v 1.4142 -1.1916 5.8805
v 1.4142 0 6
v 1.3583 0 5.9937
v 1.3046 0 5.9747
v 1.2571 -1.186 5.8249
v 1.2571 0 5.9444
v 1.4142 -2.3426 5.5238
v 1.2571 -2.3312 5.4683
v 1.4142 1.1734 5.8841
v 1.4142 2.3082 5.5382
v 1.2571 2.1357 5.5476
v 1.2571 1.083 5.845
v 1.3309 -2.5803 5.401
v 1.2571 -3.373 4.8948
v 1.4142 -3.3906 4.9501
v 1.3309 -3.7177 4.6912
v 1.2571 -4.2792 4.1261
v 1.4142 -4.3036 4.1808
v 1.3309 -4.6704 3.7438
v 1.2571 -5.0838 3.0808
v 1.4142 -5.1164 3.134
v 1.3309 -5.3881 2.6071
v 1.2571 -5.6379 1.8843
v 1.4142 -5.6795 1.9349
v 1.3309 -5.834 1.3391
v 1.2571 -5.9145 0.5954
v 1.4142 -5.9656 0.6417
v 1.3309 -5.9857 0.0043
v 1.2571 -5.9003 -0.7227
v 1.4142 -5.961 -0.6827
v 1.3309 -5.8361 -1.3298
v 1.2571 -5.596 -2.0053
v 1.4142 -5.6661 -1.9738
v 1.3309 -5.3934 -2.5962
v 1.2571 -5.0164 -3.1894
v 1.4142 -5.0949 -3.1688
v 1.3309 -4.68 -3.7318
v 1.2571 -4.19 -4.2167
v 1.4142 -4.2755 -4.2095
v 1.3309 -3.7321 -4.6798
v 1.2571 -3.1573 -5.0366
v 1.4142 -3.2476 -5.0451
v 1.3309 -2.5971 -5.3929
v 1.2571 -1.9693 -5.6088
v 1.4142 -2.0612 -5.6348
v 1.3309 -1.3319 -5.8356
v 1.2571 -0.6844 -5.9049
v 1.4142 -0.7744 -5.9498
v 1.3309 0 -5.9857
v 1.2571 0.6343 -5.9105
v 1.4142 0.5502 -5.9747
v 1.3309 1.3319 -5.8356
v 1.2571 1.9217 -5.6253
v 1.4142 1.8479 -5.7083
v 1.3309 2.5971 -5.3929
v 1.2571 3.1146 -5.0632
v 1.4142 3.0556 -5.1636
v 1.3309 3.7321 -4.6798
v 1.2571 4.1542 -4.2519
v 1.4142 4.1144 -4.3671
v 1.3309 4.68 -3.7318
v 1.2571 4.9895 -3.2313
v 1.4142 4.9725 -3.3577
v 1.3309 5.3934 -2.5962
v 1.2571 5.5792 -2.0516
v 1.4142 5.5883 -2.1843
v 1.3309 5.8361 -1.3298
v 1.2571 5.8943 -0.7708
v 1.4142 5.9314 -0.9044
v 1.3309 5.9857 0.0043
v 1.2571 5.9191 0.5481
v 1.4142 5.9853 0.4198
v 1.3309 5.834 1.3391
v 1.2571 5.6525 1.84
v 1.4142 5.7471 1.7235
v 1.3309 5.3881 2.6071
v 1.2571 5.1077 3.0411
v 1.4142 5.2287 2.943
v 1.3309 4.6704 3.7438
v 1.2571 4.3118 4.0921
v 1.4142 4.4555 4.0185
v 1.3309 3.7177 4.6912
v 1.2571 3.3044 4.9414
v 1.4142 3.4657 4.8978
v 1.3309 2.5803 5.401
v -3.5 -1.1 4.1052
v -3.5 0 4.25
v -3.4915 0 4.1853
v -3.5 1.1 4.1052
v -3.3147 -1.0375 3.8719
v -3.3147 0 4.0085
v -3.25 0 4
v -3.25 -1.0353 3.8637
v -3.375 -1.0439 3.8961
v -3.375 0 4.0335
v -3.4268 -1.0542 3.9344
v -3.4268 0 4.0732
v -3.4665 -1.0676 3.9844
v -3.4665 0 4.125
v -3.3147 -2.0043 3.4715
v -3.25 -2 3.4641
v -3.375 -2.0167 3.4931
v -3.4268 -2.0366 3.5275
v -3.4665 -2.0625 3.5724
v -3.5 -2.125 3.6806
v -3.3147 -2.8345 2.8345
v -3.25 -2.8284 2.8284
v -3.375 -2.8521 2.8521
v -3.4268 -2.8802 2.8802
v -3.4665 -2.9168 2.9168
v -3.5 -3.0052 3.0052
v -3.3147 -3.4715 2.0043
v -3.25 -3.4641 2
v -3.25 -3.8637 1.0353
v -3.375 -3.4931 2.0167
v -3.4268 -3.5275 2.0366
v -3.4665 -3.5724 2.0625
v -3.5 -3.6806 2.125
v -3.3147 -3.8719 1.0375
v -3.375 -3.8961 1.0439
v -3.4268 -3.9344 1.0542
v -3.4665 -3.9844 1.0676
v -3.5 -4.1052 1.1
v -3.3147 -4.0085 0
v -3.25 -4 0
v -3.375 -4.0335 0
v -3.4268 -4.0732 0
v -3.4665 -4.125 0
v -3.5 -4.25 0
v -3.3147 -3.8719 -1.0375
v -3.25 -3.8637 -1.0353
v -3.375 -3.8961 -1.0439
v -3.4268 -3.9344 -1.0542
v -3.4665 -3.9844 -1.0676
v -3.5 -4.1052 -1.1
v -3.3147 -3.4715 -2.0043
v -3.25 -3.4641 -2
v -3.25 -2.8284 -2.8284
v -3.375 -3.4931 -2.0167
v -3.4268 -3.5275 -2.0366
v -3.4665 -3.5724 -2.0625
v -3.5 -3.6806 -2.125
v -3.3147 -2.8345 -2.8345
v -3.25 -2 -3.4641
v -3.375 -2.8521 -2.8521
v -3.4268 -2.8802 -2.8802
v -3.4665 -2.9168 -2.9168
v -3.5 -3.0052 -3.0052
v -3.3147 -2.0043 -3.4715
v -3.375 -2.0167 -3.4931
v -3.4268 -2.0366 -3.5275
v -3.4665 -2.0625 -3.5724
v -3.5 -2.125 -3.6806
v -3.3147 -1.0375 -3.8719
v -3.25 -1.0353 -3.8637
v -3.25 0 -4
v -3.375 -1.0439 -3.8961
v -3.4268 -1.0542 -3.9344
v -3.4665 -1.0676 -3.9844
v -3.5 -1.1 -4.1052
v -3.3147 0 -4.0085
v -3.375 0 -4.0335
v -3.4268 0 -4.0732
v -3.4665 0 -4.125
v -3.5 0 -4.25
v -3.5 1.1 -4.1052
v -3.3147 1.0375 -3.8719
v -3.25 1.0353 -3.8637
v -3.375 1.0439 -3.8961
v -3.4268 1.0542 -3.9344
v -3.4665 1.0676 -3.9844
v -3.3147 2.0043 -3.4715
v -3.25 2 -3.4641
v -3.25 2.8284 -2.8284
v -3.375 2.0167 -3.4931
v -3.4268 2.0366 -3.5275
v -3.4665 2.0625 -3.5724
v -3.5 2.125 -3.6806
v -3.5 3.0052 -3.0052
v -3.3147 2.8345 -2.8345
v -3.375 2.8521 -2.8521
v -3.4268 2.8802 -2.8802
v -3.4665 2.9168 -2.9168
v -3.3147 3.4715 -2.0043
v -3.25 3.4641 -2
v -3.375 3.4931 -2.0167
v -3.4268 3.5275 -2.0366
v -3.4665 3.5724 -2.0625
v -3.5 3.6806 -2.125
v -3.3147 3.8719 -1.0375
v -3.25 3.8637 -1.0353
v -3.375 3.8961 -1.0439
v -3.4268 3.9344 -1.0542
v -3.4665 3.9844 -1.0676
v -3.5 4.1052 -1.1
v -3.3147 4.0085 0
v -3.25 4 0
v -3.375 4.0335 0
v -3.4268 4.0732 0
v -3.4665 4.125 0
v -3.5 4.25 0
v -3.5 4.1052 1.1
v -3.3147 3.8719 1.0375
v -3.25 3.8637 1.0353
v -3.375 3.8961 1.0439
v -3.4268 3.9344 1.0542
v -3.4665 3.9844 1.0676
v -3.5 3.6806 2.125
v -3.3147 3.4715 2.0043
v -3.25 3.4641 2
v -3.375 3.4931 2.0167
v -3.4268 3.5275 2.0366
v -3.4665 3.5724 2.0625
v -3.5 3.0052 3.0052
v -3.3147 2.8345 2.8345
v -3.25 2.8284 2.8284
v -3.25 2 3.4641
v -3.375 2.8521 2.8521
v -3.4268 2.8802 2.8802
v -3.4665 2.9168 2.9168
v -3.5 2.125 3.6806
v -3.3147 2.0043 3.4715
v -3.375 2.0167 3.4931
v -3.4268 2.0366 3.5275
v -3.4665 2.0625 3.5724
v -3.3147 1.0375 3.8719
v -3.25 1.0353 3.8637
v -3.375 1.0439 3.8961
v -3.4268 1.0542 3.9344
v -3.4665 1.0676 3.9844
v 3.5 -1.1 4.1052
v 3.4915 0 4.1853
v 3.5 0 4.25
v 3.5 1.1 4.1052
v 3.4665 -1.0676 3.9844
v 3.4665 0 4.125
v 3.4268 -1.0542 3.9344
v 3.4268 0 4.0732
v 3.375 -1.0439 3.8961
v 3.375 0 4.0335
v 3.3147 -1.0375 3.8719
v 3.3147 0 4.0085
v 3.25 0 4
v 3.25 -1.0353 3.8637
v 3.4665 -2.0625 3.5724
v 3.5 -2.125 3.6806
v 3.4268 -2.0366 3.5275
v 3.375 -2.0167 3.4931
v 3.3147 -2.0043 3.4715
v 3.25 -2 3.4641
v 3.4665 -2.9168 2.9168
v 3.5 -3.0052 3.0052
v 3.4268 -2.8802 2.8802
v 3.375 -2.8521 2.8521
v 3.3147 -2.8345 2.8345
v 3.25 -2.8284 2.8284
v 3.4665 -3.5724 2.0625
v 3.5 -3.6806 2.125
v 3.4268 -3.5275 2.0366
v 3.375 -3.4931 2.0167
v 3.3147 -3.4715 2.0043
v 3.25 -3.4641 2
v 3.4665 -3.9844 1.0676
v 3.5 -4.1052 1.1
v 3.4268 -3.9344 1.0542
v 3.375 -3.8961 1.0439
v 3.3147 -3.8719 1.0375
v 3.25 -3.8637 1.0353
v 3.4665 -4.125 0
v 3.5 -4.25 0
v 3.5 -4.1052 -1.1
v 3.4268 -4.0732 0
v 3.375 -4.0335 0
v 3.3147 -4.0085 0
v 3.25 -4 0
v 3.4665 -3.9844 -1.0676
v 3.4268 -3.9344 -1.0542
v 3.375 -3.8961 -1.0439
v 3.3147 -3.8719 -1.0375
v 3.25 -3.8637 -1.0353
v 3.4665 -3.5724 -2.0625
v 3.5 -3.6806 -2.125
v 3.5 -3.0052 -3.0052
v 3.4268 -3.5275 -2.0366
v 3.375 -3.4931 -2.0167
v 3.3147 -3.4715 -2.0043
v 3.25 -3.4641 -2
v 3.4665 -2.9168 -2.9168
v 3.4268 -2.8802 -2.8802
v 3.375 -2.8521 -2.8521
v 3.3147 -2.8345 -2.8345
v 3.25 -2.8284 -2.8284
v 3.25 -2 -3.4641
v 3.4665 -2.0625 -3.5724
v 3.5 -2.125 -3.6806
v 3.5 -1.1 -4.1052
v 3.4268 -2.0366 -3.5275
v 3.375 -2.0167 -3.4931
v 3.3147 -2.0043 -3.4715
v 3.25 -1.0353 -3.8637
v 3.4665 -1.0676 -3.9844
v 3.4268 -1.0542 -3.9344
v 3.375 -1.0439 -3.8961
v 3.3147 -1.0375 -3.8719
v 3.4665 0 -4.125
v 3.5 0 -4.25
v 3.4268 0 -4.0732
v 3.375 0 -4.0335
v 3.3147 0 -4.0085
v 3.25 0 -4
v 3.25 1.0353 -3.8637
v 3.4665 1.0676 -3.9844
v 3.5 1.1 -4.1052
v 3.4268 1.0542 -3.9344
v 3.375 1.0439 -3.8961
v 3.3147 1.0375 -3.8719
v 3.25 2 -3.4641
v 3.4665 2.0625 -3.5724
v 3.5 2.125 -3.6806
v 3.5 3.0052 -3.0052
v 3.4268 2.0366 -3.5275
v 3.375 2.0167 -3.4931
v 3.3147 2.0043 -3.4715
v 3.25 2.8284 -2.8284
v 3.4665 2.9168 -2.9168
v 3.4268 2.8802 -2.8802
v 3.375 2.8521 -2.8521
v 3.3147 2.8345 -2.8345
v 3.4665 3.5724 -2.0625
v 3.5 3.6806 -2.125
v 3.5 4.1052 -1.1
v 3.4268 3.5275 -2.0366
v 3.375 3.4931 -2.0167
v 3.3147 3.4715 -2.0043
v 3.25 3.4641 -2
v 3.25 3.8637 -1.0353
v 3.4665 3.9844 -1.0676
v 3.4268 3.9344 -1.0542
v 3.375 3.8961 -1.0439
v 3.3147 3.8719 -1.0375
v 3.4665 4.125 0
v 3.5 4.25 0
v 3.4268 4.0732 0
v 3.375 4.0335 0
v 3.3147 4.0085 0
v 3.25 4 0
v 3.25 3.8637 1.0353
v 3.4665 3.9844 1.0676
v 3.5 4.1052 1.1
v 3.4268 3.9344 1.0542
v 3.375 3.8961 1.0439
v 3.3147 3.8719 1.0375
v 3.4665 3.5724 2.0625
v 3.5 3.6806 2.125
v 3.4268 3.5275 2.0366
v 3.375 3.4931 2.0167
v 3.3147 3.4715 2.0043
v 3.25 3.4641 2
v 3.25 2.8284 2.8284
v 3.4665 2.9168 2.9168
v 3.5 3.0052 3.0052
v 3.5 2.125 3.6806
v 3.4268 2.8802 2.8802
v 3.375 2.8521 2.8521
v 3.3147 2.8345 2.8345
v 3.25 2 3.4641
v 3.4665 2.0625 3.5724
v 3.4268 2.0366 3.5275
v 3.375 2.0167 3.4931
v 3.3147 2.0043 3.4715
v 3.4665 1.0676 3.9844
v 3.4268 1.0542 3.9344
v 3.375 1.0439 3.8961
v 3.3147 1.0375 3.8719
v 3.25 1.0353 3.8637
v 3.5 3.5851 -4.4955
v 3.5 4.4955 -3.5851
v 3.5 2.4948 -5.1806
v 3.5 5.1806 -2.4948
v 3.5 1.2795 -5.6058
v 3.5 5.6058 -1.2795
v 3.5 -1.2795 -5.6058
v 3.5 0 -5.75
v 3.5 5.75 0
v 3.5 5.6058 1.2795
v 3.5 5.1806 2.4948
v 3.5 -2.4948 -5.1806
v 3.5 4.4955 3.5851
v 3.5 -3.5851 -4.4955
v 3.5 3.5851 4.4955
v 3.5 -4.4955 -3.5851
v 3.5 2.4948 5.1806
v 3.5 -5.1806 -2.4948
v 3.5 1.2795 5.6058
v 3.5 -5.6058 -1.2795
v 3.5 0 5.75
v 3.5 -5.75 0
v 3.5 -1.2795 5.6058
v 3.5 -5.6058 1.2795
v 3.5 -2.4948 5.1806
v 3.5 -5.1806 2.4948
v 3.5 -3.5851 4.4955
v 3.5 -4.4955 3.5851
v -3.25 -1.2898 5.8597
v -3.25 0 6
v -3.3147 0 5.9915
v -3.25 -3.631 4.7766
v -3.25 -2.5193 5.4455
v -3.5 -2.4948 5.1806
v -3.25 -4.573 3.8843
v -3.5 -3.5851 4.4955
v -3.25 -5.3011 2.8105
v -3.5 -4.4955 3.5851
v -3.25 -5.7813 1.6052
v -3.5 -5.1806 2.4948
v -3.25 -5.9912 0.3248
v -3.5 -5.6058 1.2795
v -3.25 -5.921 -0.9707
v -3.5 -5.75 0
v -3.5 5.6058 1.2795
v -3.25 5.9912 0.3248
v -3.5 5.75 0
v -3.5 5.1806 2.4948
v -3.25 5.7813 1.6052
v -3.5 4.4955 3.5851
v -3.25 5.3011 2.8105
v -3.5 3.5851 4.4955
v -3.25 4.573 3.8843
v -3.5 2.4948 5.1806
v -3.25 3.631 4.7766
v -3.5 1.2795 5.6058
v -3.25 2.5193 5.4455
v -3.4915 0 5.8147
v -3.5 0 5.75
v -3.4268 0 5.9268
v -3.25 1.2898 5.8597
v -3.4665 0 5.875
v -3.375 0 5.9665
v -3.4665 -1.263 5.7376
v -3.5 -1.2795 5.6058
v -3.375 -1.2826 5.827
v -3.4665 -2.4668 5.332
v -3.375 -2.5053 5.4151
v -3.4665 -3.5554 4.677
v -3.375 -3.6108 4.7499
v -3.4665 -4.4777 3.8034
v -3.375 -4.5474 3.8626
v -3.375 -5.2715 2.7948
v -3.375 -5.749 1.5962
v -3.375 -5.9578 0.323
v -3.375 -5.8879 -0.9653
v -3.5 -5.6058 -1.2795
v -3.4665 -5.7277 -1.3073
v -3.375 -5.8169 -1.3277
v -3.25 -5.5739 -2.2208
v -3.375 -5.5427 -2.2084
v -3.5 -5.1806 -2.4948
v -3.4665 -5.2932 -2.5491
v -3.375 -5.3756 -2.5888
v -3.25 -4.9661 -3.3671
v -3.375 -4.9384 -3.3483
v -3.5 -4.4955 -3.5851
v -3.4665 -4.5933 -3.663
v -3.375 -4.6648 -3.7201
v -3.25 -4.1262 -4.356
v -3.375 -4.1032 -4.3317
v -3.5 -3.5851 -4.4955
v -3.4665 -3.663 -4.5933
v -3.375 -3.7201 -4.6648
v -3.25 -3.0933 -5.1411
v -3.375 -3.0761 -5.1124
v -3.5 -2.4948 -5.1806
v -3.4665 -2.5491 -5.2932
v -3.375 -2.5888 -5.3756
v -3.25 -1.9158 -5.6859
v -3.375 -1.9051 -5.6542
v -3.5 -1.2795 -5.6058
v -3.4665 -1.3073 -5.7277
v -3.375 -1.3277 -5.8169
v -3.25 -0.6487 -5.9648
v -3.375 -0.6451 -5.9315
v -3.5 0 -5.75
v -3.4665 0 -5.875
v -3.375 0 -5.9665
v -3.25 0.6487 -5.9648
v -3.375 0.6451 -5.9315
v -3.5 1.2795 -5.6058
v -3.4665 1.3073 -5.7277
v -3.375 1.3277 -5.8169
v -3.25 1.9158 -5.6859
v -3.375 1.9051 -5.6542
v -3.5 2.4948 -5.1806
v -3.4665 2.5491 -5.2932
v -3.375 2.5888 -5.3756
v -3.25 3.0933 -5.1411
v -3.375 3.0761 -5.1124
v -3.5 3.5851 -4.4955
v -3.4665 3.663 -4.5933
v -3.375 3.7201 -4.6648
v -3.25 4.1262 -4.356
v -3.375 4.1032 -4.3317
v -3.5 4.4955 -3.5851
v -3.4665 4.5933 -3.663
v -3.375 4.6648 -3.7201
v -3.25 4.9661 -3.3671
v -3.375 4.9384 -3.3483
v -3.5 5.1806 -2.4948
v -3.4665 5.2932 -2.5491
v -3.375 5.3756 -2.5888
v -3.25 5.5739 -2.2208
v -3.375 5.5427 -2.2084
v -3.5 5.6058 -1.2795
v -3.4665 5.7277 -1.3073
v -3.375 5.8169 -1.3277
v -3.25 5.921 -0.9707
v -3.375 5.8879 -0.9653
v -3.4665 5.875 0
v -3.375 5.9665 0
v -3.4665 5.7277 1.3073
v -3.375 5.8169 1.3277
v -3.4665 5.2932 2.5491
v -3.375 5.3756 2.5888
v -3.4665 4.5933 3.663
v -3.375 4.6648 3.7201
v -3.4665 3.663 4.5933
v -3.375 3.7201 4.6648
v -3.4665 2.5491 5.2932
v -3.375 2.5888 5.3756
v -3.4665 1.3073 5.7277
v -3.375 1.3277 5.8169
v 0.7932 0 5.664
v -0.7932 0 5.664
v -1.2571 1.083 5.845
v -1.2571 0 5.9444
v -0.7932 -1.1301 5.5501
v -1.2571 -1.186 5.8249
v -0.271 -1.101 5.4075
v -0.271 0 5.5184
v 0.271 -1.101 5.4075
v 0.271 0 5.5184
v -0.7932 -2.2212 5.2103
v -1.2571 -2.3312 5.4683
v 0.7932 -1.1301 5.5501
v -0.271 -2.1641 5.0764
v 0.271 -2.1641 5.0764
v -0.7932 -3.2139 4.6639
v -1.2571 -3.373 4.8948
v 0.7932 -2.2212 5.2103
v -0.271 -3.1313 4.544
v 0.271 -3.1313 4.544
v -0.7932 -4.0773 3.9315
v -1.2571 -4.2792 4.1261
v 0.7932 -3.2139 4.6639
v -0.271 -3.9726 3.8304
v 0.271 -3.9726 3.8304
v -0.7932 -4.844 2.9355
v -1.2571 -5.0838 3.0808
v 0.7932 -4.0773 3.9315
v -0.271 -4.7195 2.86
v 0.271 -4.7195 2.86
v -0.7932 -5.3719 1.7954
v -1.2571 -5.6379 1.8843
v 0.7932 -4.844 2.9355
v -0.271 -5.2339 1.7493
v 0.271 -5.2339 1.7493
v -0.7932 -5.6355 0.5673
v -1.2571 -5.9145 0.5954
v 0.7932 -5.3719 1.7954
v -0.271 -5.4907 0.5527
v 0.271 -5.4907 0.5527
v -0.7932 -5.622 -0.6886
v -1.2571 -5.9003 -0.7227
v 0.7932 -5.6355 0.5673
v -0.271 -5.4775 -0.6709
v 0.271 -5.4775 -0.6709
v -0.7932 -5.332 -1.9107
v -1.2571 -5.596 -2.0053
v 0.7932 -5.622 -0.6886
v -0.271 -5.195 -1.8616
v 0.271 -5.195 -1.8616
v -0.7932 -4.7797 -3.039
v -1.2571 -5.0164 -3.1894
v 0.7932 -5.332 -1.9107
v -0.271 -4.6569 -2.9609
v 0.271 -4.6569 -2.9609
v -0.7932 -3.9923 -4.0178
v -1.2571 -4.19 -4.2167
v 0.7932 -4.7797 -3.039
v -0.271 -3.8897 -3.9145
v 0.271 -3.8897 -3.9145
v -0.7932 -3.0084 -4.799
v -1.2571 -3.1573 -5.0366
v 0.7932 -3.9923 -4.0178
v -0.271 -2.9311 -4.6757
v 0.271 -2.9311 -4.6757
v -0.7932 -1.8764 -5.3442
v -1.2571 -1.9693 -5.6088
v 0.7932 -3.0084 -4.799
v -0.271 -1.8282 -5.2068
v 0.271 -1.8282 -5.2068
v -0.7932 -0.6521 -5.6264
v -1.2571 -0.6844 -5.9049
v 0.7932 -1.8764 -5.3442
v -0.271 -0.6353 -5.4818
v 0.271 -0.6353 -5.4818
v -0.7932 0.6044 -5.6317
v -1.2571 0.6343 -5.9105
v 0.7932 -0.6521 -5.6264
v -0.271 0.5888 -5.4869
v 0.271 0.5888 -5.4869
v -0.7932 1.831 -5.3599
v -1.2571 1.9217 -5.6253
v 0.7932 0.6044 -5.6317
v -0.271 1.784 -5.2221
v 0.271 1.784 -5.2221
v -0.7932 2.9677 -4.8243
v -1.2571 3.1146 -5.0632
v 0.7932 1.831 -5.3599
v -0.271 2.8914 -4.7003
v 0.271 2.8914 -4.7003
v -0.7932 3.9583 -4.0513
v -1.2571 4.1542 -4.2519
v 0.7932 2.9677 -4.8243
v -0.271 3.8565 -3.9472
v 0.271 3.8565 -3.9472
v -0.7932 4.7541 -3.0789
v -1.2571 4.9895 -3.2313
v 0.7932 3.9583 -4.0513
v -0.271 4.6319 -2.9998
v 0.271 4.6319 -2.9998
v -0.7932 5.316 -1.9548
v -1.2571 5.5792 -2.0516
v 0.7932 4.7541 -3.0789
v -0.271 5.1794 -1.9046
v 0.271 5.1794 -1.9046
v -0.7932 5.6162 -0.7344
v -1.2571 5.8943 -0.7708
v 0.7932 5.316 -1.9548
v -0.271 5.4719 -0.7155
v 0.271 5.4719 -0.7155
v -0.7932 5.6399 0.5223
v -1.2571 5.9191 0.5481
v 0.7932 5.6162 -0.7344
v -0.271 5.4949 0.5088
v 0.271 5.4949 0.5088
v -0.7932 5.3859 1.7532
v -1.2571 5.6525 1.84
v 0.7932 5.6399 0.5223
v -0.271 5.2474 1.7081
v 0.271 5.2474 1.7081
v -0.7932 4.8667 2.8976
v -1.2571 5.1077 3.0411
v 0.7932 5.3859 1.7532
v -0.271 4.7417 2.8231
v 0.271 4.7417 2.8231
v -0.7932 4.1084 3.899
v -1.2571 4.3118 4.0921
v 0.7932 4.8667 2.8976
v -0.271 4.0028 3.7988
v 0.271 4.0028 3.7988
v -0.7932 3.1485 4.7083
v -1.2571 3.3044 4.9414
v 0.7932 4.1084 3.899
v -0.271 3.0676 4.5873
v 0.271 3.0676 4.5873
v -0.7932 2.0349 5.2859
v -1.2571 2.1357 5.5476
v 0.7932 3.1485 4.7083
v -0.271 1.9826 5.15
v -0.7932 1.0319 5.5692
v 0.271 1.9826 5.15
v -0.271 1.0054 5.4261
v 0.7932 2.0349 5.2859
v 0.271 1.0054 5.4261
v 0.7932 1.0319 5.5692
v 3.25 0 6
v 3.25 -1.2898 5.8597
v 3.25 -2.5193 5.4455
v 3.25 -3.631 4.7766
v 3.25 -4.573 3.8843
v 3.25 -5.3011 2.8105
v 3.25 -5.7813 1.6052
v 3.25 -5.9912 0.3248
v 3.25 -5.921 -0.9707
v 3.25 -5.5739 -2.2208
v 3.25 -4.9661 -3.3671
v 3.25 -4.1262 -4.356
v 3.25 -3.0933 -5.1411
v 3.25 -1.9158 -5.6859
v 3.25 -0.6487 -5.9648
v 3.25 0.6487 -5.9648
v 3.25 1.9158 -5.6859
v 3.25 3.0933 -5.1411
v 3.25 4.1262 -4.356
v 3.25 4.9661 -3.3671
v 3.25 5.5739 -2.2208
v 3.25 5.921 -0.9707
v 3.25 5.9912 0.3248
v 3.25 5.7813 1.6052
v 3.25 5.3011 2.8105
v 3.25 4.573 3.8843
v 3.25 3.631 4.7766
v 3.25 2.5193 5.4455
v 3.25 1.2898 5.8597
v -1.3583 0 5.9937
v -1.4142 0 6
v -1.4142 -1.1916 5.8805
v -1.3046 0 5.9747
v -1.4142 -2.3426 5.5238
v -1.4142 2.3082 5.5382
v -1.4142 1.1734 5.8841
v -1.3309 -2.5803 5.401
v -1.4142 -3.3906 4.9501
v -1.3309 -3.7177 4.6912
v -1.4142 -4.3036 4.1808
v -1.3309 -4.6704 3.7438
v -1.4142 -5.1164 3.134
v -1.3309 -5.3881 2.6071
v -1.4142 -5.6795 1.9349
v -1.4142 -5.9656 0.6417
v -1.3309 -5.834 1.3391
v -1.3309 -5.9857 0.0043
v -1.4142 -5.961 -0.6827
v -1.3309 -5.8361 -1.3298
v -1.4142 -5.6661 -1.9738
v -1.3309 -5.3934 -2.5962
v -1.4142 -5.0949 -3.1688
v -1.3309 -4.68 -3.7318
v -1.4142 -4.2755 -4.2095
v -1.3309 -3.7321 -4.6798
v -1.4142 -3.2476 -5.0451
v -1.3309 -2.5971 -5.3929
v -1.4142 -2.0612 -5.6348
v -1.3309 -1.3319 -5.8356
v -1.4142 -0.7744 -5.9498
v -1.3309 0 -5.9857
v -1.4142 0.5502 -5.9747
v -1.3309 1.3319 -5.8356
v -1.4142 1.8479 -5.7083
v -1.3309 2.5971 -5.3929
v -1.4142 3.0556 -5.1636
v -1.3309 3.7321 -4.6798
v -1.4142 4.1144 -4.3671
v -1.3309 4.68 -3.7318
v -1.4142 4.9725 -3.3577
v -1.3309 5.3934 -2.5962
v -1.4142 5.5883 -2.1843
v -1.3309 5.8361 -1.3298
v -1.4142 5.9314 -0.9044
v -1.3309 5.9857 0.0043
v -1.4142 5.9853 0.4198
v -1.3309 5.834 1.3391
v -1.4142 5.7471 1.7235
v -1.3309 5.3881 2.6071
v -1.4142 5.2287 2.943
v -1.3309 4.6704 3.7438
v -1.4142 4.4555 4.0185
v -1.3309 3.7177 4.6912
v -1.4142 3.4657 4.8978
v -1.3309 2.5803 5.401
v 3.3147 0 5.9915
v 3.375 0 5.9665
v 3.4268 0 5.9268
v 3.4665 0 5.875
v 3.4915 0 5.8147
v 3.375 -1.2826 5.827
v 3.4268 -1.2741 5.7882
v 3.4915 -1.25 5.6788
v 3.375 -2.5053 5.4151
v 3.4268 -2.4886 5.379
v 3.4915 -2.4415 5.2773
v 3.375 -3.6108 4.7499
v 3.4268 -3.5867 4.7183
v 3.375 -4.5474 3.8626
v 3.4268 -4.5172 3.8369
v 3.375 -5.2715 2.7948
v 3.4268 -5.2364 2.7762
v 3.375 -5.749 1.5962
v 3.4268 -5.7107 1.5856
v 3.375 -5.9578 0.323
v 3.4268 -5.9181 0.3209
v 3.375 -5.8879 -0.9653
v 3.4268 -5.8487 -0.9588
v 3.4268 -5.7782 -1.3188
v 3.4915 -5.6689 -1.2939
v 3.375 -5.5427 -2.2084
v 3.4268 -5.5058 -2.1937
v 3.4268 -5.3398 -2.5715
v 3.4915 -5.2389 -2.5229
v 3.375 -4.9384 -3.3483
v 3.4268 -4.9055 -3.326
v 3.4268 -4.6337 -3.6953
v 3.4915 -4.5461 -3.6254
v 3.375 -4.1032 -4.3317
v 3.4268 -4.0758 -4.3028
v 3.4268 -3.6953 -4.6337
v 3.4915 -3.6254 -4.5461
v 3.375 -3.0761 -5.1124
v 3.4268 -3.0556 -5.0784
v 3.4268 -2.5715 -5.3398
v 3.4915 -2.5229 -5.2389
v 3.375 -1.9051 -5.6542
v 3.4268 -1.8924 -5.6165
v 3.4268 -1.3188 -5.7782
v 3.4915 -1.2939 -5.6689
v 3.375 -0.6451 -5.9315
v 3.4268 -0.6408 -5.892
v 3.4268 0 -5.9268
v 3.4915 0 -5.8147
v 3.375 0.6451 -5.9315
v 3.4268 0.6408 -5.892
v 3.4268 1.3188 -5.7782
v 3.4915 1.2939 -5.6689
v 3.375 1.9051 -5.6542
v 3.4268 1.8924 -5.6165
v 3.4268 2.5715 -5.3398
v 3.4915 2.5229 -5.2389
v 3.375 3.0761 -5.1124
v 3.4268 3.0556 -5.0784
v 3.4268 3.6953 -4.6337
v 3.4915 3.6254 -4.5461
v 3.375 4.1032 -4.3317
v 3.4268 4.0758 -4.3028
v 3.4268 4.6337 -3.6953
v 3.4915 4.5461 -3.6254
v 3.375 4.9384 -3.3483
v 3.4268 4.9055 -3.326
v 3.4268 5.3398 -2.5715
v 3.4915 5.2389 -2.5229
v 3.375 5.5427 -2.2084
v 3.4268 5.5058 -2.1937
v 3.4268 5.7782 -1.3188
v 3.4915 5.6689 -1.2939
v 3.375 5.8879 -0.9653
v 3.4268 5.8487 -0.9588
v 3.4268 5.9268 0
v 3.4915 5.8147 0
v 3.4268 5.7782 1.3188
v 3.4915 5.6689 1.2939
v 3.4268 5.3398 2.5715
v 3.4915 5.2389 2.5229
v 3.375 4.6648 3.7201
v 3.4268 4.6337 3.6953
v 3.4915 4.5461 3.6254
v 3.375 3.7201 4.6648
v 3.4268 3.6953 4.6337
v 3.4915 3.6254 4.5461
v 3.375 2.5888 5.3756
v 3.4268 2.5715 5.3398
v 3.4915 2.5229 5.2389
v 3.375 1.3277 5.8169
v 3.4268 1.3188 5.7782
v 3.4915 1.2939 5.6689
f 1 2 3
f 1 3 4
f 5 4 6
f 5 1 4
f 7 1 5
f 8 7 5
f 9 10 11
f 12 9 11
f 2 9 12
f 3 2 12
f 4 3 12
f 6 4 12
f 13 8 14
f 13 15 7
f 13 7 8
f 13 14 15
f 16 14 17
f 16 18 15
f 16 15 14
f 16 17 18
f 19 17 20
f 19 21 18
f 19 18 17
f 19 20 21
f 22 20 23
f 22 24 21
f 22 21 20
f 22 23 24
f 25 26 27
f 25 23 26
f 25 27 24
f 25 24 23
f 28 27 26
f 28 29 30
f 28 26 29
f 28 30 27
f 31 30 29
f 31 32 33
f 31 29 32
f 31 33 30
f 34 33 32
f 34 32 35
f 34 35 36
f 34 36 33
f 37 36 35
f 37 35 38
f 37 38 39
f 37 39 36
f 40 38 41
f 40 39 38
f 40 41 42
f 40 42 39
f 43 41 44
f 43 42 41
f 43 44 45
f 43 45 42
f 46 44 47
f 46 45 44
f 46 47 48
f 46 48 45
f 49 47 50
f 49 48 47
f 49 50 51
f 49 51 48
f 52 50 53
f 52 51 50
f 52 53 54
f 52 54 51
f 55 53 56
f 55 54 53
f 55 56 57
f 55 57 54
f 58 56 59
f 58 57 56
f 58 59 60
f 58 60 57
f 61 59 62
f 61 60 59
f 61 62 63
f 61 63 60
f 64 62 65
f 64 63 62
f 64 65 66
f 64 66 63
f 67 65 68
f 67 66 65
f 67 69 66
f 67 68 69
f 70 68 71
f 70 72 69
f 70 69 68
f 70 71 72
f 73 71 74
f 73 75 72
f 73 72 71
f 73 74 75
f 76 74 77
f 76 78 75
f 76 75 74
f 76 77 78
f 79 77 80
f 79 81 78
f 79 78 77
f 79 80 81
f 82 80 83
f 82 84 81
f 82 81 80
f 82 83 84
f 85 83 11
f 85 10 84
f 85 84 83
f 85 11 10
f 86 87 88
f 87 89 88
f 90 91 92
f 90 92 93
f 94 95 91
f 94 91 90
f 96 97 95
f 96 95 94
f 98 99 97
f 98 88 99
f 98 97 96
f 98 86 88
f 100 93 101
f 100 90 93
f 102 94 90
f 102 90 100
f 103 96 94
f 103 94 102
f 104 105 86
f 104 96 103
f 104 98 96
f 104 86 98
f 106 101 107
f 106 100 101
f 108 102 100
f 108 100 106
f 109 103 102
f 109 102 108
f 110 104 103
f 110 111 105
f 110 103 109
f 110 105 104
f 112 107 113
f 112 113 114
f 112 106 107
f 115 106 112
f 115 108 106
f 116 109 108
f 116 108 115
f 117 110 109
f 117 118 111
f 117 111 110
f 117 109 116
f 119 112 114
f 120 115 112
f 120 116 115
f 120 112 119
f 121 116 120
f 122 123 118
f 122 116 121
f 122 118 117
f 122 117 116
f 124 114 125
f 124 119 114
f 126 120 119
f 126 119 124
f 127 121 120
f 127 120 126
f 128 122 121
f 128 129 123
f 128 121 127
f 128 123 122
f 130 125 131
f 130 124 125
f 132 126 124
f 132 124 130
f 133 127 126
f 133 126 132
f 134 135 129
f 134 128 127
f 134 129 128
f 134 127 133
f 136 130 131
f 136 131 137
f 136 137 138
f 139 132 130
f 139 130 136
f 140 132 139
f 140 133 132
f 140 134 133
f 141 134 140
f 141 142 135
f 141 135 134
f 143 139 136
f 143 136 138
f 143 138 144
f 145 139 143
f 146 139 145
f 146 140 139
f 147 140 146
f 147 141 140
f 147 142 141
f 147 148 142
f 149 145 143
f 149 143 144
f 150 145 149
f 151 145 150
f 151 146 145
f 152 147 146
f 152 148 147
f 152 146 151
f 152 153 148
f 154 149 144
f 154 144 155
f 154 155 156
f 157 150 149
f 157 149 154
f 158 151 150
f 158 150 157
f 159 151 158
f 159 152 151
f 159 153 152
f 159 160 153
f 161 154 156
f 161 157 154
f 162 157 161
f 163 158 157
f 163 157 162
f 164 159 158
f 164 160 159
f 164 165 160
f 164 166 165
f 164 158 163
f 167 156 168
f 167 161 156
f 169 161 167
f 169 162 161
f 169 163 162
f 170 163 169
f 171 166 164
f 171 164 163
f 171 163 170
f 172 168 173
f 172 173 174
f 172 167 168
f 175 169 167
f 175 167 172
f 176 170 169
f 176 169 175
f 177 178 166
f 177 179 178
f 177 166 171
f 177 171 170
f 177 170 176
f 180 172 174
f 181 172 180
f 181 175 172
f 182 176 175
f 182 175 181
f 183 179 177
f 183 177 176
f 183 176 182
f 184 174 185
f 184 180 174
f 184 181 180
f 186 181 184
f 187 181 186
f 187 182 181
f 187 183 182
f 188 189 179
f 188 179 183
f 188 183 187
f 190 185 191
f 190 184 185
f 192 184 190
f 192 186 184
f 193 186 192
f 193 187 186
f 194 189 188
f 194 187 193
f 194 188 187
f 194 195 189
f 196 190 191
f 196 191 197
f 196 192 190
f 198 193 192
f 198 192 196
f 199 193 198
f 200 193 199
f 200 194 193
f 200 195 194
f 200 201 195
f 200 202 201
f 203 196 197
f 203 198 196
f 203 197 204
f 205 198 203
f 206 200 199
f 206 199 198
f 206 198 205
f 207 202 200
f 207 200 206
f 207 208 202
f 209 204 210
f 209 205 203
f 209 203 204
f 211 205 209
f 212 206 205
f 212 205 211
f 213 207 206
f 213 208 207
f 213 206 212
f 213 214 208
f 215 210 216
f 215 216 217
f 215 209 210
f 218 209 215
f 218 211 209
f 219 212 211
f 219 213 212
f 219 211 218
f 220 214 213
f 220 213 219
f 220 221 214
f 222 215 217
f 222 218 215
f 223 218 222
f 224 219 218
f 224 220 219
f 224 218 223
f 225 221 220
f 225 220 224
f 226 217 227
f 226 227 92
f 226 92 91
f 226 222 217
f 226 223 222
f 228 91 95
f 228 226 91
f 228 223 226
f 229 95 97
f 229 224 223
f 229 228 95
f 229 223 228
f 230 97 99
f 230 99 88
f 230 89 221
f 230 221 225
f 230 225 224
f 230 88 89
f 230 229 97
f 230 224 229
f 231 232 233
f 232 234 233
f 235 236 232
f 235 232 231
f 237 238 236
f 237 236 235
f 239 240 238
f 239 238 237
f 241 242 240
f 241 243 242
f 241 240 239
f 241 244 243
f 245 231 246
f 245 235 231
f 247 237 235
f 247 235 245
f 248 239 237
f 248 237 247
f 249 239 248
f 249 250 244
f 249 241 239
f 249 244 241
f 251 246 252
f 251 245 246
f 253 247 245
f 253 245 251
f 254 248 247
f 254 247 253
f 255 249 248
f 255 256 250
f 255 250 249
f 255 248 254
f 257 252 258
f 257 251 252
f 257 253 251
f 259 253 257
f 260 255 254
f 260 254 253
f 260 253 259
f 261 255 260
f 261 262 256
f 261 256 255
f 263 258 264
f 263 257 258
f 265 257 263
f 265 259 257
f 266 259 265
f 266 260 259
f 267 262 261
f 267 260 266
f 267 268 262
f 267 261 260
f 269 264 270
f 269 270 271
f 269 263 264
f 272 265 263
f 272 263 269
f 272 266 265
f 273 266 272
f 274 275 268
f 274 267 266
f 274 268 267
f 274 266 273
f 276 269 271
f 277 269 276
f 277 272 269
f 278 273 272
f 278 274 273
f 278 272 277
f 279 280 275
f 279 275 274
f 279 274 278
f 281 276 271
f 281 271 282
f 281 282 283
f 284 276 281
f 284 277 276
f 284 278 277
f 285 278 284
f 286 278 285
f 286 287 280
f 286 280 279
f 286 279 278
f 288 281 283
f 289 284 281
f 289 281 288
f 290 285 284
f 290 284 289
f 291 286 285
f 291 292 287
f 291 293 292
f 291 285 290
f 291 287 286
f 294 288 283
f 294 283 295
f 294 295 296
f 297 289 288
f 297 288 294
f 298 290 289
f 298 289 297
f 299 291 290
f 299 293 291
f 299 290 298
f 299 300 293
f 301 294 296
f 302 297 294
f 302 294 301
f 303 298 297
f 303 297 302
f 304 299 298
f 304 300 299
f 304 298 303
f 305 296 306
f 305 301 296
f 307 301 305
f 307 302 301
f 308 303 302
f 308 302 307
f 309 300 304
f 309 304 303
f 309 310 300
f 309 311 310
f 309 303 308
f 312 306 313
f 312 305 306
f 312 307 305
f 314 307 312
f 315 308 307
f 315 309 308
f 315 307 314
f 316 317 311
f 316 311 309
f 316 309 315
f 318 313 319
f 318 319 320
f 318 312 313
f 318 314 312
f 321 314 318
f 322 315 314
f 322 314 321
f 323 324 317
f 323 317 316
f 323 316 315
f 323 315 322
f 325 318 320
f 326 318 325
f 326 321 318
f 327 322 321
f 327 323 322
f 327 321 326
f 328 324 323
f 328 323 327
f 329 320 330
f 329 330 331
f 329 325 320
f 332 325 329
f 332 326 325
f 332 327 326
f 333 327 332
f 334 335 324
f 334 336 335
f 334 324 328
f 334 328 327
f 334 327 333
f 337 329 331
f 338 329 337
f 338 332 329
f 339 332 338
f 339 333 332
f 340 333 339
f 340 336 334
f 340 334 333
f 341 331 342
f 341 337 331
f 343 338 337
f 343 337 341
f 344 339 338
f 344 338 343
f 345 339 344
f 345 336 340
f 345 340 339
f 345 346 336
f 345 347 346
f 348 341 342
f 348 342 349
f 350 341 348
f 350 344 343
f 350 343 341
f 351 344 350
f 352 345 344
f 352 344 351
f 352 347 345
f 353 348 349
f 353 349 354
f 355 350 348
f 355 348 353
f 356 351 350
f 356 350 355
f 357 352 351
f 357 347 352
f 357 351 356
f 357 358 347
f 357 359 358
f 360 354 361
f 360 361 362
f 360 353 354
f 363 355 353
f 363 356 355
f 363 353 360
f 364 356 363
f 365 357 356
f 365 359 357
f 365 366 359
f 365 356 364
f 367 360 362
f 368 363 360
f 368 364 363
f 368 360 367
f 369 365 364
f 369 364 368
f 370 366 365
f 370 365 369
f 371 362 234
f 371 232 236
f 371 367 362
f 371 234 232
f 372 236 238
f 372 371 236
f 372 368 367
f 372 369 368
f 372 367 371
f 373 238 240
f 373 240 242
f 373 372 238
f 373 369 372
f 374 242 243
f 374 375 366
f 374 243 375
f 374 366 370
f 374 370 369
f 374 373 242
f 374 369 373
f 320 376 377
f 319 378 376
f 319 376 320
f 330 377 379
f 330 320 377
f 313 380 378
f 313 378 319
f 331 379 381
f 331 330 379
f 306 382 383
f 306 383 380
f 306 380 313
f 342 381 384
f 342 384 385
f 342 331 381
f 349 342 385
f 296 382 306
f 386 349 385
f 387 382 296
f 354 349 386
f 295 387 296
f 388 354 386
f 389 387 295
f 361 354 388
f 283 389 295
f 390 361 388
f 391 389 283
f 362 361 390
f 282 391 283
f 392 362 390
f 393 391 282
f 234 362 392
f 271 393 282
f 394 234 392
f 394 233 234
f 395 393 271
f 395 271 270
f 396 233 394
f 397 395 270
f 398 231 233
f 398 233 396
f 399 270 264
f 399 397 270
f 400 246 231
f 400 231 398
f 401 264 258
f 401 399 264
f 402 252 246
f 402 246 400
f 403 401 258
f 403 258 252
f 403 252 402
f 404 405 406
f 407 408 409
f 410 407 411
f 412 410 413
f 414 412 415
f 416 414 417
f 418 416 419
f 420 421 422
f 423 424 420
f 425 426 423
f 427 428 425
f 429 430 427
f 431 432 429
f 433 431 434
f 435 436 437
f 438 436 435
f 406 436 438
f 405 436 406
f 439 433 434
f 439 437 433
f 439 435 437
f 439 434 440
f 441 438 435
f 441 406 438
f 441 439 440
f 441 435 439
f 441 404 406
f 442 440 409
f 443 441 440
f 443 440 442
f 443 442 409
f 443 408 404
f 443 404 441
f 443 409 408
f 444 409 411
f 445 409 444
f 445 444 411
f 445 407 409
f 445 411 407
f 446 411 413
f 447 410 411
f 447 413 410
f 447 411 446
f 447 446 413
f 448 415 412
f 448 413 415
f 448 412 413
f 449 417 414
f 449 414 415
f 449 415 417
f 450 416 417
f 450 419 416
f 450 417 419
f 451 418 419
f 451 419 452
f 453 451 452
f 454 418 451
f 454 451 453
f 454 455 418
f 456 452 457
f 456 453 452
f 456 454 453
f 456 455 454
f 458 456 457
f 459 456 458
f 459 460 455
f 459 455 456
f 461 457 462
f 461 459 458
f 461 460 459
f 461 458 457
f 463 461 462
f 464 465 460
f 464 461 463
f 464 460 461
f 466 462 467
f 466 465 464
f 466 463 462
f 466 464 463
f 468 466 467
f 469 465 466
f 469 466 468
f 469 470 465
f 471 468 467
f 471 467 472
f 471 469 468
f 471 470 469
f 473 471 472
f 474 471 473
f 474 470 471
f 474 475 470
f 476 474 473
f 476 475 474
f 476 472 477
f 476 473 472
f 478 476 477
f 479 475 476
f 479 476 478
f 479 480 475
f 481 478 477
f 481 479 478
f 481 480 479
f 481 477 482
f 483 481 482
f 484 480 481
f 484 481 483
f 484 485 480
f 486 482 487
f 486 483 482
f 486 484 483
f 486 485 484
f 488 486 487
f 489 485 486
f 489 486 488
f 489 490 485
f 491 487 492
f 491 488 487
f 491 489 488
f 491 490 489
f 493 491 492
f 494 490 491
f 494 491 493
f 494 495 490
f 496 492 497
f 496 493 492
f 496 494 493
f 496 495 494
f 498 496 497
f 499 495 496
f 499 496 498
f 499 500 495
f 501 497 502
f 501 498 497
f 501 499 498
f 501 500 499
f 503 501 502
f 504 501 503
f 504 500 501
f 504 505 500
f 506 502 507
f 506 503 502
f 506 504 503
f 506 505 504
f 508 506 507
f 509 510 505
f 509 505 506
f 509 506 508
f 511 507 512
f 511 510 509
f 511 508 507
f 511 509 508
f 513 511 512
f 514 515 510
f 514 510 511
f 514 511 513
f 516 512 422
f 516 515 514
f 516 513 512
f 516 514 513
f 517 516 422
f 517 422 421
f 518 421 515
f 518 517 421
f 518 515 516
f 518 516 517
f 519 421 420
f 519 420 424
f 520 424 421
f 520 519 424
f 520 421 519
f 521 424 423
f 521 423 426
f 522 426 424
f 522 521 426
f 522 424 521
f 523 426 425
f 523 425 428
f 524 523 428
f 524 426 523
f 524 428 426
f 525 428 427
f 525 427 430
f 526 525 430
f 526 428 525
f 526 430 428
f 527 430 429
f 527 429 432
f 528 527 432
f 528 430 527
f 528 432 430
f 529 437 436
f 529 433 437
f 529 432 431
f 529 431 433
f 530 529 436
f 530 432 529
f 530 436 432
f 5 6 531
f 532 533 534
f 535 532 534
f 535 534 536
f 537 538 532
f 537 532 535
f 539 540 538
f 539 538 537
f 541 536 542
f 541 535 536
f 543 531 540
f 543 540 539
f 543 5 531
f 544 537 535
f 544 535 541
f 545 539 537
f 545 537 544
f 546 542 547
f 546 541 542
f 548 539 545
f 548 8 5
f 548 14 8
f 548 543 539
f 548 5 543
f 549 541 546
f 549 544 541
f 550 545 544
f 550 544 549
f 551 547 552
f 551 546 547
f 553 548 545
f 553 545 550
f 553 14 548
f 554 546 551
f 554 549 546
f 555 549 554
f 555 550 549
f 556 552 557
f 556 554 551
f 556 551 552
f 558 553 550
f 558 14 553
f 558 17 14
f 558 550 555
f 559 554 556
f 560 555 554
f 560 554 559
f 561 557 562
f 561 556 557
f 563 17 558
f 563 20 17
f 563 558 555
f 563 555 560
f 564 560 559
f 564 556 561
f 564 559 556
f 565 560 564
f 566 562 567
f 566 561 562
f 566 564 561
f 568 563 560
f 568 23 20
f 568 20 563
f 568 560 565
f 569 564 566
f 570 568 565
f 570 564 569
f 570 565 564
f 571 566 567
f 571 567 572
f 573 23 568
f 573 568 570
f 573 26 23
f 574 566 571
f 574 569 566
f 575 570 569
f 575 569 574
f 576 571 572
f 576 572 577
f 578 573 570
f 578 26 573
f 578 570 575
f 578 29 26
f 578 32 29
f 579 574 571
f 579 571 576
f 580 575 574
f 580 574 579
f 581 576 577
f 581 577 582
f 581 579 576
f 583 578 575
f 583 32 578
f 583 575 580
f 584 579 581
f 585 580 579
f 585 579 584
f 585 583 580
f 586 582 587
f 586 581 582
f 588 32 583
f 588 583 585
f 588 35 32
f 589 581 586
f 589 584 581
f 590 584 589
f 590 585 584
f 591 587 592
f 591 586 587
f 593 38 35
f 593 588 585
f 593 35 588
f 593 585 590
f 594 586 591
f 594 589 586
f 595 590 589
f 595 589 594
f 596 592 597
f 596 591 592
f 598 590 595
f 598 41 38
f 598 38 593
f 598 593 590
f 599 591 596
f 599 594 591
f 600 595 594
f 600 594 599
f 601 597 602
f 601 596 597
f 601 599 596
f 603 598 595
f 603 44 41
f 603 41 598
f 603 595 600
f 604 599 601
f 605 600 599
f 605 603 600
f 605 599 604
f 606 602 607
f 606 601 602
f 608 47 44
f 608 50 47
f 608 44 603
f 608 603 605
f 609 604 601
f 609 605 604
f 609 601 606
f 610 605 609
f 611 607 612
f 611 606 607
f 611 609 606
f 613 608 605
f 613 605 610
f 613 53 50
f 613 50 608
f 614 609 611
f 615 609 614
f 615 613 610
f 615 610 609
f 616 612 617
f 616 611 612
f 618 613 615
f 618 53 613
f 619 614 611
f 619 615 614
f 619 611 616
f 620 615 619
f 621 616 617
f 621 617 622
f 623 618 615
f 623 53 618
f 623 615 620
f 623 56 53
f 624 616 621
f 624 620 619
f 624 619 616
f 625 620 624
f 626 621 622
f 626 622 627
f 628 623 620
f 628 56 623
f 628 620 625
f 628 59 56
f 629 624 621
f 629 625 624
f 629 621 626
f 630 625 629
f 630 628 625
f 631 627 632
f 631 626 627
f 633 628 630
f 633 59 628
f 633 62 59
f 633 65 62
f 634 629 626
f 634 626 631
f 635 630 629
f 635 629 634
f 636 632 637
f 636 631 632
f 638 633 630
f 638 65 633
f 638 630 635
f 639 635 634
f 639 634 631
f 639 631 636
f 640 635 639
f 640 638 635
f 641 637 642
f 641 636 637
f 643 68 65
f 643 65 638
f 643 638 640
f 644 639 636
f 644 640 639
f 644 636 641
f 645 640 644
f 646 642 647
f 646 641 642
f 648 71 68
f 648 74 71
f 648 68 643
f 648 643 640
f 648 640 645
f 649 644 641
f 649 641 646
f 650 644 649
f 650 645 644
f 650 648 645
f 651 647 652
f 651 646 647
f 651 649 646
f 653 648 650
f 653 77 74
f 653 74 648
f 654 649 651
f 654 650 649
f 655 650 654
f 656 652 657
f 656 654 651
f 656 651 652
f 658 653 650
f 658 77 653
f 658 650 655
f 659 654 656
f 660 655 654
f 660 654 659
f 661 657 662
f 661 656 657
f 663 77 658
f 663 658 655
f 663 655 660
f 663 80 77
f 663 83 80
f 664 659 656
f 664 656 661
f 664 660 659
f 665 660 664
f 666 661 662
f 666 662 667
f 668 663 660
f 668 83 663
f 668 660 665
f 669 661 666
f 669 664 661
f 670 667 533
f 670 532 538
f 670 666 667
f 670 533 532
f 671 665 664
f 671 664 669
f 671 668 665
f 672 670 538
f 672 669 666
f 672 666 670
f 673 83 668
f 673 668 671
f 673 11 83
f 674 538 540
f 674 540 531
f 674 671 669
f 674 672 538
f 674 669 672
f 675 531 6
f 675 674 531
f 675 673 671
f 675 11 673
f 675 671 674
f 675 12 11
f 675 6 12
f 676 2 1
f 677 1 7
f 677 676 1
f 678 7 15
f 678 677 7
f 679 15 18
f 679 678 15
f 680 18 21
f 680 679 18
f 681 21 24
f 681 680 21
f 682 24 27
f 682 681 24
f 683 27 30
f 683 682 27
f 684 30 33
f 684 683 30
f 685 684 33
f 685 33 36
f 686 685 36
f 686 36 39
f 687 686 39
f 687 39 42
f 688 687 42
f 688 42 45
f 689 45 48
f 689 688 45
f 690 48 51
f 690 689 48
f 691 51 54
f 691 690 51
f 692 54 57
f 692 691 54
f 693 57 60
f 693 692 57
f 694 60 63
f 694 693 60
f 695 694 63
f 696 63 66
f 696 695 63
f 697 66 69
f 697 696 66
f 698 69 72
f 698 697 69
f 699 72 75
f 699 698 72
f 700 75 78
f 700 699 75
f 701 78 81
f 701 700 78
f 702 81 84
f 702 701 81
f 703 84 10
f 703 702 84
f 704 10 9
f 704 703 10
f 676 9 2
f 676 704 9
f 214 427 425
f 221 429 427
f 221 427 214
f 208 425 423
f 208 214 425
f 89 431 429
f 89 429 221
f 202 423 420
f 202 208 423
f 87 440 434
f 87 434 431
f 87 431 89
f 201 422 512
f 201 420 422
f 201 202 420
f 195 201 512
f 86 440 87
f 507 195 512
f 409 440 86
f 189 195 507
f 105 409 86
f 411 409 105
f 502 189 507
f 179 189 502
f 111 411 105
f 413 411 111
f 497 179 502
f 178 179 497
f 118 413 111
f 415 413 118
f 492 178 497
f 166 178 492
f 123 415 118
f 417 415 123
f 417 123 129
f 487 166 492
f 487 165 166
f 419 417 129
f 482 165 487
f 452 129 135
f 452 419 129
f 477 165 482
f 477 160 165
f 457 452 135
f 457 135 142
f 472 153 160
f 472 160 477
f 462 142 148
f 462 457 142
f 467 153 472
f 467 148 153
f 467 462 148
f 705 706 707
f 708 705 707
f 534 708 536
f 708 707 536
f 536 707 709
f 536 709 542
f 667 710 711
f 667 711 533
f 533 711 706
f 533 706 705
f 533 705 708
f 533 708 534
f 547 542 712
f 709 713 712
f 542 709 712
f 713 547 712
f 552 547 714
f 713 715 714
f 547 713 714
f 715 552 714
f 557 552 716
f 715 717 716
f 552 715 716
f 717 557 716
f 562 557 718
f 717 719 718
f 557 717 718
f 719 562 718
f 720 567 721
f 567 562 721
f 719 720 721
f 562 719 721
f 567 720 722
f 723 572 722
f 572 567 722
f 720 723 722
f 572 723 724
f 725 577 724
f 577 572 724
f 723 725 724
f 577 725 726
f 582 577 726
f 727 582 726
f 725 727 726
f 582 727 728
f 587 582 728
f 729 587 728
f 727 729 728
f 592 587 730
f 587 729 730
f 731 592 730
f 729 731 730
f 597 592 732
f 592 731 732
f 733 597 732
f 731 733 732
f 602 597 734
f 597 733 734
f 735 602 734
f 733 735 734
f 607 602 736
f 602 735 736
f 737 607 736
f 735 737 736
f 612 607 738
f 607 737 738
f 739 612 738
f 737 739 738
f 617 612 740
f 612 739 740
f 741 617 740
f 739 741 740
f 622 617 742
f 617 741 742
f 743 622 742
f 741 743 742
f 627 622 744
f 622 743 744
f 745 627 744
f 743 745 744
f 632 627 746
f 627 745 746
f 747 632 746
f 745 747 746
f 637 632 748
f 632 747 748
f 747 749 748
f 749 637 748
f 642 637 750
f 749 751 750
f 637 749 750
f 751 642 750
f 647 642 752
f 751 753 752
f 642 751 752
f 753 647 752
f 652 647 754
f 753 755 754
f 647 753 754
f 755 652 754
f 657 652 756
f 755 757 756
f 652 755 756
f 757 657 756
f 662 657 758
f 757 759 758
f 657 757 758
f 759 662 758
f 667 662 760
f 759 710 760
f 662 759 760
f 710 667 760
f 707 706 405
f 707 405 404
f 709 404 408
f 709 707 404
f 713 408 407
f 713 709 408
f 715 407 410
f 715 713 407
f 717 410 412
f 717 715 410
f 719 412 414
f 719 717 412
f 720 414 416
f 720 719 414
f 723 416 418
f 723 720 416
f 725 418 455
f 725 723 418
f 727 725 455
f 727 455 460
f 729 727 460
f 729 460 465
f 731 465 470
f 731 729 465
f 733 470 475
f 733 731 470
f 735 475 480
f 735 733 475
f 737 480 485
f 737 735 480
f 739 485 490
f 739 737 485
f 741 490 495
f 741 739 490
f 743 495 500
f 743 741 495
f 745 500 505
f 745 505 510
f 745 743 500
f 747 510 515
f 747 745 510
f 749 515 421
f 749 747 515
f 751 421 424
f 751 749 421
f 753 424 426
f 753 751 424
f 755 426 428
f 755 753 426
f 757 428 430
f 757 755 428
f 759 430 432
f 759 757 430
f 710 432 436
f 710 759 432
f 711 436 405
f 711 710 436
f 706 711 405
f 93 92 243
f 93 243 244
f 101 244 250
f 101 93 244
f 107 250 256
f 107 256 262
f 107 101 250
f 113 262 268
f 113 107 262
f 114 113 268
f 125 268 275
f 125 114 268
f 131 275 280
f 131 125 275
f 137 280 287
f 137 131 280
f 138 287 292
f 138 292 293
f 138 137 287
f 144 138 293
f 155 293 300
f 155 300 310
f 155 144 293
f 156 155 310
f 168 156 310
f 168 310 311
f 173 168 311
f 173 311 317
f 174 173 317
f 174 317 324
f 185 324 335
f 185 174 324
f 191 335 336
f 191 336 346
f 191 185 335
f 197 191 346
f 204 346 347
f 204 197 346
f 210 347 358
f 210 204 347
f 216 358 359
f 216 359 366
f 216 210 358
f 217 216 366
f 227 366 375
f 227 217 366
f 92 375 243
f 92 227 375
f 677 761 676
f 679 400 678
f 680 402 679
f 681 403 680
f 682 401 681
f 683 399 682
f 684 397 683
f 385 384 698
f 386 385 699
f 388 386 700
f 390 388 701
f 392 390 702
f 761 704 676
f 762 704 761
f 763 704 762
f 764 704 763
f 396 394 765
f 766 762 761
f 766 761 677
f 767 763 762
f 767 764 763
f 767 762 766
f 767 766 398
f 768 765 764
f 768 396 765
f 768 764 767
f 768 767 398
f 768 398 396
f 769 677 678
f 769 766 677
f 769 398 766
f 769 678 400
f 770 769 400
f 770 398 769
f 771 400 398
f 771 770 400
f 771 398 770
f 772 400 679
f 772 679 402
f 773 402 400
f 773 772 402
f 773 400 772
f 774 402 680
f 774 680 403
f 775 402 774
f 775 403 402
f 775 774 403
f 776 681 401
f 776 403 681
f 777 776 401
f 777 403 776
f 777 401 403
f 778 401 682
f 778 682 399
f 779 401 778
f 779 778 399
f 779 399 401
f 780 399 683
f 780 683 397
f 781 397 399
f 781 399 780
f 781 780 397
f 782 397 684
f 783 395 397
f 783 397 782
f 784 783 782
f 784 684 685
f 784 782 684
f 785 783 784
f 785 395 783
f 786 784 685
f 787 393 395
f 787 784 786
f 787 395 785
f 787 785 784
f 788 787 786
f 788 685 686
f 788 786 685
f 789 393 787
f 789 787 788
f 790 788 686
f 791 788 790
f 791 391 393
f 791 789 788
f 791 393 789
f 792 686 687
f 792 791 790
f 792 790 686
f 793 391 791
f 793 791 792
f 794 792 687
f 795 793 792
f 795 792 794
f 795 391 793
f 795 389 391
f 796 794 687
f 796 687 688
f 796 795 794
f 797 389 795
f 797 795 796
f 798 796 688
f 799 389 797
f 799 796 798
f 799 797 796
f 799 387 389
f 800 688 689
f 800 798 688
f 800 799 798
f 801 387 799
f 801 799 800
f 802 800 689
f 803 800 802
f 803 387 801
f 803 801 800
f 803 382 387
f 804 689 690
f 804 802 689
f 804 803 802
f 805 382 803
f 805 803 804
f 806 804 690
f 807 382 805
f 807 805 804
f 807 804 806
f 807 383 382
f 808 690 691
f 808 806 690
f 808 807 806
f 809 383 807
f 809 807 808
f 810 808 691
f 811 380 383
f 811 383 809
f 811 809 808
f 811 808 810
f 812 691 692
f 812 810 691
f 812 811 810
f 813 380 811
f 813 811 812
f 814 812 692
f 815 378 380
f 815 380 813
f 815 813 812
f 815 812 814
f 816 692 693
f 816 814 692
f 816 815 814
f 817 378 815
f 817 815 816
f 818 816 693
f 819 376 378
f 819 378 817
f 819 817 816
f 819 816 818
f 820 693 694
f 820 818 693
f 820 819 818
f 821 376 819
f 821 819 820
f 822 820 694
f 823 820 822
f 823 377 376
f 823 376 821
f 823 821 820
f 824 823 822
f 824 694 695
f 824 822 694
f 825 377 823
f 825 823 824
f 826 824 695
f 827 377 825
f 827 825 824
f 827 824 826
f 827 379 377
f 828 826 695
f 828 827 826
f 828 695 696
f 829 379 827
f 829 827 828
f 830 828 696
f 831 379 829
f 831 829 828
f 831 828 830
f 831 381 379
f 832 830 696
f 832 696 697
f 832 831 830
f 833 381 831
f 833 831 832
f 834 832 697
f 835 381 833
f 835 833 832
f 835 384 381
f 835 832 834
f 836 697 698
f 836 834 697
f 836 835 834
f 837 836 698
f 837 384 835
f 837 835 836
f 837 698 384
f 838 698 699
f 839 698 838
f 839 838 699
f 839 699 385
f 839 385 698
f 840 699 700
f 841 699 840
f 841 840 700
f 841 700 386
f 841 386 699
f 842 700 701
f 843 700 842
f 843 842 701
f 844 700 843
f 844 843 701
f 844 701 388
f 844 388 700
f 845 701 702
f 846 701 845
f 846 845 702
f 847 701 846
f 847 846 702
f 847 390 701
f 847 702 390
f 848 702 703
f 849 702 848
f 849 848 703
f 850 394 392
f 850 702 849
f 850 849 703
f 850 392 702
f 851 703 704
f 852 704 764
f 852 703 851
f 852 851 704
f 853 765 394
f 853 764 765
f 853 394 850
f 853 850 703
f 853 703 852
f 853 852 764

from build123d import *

# Parameters (mm, degrees)
CONG_1_R = 0.25


with BuildPart() as part:
    # Esquisse1 → Révolution1 (revolve)
    with BuildSketch(Plane.XY, mode=Mode.PRIVATE) as r_volution1_sk:
        with BuildLine():
            Line((1.322875656, 6), (3.5, 6))
            Line((3.5, 6), (3.5, 4))
            Line((3.5, 4), (-3.5, 4))
            Line((-3.5, 4), (-3.5, 6))
            Line((-3.5, 6), (-1.322875656, 6))
            ThreePointArc((-1.322875656, 6), (0, 5.5), (1.322875656, 6))
        make_face()
    revolve(r_volution1_sk.sketch.rotate(Axis((-31.667666126, 0, 0), (1, 0, 0)), 90), axis=Axis((-31.667666126, 0, 0), (1, 0, 0)))

    # Congé1
    cong_1_edges = [part.edges().sort_by_distance(p)[0] for p in [
        (1.322875656, 0, -6),
        (3.5, 0, -6),
        (3.5, 0, -4),
        (-3.5, 0, -4),
        (-3.5, 0, -6),
        (-1.322875656, 0, -6),
    ]]
    fillet(cong_1_edges, radius=CONG_1_R)


solid = part.part
